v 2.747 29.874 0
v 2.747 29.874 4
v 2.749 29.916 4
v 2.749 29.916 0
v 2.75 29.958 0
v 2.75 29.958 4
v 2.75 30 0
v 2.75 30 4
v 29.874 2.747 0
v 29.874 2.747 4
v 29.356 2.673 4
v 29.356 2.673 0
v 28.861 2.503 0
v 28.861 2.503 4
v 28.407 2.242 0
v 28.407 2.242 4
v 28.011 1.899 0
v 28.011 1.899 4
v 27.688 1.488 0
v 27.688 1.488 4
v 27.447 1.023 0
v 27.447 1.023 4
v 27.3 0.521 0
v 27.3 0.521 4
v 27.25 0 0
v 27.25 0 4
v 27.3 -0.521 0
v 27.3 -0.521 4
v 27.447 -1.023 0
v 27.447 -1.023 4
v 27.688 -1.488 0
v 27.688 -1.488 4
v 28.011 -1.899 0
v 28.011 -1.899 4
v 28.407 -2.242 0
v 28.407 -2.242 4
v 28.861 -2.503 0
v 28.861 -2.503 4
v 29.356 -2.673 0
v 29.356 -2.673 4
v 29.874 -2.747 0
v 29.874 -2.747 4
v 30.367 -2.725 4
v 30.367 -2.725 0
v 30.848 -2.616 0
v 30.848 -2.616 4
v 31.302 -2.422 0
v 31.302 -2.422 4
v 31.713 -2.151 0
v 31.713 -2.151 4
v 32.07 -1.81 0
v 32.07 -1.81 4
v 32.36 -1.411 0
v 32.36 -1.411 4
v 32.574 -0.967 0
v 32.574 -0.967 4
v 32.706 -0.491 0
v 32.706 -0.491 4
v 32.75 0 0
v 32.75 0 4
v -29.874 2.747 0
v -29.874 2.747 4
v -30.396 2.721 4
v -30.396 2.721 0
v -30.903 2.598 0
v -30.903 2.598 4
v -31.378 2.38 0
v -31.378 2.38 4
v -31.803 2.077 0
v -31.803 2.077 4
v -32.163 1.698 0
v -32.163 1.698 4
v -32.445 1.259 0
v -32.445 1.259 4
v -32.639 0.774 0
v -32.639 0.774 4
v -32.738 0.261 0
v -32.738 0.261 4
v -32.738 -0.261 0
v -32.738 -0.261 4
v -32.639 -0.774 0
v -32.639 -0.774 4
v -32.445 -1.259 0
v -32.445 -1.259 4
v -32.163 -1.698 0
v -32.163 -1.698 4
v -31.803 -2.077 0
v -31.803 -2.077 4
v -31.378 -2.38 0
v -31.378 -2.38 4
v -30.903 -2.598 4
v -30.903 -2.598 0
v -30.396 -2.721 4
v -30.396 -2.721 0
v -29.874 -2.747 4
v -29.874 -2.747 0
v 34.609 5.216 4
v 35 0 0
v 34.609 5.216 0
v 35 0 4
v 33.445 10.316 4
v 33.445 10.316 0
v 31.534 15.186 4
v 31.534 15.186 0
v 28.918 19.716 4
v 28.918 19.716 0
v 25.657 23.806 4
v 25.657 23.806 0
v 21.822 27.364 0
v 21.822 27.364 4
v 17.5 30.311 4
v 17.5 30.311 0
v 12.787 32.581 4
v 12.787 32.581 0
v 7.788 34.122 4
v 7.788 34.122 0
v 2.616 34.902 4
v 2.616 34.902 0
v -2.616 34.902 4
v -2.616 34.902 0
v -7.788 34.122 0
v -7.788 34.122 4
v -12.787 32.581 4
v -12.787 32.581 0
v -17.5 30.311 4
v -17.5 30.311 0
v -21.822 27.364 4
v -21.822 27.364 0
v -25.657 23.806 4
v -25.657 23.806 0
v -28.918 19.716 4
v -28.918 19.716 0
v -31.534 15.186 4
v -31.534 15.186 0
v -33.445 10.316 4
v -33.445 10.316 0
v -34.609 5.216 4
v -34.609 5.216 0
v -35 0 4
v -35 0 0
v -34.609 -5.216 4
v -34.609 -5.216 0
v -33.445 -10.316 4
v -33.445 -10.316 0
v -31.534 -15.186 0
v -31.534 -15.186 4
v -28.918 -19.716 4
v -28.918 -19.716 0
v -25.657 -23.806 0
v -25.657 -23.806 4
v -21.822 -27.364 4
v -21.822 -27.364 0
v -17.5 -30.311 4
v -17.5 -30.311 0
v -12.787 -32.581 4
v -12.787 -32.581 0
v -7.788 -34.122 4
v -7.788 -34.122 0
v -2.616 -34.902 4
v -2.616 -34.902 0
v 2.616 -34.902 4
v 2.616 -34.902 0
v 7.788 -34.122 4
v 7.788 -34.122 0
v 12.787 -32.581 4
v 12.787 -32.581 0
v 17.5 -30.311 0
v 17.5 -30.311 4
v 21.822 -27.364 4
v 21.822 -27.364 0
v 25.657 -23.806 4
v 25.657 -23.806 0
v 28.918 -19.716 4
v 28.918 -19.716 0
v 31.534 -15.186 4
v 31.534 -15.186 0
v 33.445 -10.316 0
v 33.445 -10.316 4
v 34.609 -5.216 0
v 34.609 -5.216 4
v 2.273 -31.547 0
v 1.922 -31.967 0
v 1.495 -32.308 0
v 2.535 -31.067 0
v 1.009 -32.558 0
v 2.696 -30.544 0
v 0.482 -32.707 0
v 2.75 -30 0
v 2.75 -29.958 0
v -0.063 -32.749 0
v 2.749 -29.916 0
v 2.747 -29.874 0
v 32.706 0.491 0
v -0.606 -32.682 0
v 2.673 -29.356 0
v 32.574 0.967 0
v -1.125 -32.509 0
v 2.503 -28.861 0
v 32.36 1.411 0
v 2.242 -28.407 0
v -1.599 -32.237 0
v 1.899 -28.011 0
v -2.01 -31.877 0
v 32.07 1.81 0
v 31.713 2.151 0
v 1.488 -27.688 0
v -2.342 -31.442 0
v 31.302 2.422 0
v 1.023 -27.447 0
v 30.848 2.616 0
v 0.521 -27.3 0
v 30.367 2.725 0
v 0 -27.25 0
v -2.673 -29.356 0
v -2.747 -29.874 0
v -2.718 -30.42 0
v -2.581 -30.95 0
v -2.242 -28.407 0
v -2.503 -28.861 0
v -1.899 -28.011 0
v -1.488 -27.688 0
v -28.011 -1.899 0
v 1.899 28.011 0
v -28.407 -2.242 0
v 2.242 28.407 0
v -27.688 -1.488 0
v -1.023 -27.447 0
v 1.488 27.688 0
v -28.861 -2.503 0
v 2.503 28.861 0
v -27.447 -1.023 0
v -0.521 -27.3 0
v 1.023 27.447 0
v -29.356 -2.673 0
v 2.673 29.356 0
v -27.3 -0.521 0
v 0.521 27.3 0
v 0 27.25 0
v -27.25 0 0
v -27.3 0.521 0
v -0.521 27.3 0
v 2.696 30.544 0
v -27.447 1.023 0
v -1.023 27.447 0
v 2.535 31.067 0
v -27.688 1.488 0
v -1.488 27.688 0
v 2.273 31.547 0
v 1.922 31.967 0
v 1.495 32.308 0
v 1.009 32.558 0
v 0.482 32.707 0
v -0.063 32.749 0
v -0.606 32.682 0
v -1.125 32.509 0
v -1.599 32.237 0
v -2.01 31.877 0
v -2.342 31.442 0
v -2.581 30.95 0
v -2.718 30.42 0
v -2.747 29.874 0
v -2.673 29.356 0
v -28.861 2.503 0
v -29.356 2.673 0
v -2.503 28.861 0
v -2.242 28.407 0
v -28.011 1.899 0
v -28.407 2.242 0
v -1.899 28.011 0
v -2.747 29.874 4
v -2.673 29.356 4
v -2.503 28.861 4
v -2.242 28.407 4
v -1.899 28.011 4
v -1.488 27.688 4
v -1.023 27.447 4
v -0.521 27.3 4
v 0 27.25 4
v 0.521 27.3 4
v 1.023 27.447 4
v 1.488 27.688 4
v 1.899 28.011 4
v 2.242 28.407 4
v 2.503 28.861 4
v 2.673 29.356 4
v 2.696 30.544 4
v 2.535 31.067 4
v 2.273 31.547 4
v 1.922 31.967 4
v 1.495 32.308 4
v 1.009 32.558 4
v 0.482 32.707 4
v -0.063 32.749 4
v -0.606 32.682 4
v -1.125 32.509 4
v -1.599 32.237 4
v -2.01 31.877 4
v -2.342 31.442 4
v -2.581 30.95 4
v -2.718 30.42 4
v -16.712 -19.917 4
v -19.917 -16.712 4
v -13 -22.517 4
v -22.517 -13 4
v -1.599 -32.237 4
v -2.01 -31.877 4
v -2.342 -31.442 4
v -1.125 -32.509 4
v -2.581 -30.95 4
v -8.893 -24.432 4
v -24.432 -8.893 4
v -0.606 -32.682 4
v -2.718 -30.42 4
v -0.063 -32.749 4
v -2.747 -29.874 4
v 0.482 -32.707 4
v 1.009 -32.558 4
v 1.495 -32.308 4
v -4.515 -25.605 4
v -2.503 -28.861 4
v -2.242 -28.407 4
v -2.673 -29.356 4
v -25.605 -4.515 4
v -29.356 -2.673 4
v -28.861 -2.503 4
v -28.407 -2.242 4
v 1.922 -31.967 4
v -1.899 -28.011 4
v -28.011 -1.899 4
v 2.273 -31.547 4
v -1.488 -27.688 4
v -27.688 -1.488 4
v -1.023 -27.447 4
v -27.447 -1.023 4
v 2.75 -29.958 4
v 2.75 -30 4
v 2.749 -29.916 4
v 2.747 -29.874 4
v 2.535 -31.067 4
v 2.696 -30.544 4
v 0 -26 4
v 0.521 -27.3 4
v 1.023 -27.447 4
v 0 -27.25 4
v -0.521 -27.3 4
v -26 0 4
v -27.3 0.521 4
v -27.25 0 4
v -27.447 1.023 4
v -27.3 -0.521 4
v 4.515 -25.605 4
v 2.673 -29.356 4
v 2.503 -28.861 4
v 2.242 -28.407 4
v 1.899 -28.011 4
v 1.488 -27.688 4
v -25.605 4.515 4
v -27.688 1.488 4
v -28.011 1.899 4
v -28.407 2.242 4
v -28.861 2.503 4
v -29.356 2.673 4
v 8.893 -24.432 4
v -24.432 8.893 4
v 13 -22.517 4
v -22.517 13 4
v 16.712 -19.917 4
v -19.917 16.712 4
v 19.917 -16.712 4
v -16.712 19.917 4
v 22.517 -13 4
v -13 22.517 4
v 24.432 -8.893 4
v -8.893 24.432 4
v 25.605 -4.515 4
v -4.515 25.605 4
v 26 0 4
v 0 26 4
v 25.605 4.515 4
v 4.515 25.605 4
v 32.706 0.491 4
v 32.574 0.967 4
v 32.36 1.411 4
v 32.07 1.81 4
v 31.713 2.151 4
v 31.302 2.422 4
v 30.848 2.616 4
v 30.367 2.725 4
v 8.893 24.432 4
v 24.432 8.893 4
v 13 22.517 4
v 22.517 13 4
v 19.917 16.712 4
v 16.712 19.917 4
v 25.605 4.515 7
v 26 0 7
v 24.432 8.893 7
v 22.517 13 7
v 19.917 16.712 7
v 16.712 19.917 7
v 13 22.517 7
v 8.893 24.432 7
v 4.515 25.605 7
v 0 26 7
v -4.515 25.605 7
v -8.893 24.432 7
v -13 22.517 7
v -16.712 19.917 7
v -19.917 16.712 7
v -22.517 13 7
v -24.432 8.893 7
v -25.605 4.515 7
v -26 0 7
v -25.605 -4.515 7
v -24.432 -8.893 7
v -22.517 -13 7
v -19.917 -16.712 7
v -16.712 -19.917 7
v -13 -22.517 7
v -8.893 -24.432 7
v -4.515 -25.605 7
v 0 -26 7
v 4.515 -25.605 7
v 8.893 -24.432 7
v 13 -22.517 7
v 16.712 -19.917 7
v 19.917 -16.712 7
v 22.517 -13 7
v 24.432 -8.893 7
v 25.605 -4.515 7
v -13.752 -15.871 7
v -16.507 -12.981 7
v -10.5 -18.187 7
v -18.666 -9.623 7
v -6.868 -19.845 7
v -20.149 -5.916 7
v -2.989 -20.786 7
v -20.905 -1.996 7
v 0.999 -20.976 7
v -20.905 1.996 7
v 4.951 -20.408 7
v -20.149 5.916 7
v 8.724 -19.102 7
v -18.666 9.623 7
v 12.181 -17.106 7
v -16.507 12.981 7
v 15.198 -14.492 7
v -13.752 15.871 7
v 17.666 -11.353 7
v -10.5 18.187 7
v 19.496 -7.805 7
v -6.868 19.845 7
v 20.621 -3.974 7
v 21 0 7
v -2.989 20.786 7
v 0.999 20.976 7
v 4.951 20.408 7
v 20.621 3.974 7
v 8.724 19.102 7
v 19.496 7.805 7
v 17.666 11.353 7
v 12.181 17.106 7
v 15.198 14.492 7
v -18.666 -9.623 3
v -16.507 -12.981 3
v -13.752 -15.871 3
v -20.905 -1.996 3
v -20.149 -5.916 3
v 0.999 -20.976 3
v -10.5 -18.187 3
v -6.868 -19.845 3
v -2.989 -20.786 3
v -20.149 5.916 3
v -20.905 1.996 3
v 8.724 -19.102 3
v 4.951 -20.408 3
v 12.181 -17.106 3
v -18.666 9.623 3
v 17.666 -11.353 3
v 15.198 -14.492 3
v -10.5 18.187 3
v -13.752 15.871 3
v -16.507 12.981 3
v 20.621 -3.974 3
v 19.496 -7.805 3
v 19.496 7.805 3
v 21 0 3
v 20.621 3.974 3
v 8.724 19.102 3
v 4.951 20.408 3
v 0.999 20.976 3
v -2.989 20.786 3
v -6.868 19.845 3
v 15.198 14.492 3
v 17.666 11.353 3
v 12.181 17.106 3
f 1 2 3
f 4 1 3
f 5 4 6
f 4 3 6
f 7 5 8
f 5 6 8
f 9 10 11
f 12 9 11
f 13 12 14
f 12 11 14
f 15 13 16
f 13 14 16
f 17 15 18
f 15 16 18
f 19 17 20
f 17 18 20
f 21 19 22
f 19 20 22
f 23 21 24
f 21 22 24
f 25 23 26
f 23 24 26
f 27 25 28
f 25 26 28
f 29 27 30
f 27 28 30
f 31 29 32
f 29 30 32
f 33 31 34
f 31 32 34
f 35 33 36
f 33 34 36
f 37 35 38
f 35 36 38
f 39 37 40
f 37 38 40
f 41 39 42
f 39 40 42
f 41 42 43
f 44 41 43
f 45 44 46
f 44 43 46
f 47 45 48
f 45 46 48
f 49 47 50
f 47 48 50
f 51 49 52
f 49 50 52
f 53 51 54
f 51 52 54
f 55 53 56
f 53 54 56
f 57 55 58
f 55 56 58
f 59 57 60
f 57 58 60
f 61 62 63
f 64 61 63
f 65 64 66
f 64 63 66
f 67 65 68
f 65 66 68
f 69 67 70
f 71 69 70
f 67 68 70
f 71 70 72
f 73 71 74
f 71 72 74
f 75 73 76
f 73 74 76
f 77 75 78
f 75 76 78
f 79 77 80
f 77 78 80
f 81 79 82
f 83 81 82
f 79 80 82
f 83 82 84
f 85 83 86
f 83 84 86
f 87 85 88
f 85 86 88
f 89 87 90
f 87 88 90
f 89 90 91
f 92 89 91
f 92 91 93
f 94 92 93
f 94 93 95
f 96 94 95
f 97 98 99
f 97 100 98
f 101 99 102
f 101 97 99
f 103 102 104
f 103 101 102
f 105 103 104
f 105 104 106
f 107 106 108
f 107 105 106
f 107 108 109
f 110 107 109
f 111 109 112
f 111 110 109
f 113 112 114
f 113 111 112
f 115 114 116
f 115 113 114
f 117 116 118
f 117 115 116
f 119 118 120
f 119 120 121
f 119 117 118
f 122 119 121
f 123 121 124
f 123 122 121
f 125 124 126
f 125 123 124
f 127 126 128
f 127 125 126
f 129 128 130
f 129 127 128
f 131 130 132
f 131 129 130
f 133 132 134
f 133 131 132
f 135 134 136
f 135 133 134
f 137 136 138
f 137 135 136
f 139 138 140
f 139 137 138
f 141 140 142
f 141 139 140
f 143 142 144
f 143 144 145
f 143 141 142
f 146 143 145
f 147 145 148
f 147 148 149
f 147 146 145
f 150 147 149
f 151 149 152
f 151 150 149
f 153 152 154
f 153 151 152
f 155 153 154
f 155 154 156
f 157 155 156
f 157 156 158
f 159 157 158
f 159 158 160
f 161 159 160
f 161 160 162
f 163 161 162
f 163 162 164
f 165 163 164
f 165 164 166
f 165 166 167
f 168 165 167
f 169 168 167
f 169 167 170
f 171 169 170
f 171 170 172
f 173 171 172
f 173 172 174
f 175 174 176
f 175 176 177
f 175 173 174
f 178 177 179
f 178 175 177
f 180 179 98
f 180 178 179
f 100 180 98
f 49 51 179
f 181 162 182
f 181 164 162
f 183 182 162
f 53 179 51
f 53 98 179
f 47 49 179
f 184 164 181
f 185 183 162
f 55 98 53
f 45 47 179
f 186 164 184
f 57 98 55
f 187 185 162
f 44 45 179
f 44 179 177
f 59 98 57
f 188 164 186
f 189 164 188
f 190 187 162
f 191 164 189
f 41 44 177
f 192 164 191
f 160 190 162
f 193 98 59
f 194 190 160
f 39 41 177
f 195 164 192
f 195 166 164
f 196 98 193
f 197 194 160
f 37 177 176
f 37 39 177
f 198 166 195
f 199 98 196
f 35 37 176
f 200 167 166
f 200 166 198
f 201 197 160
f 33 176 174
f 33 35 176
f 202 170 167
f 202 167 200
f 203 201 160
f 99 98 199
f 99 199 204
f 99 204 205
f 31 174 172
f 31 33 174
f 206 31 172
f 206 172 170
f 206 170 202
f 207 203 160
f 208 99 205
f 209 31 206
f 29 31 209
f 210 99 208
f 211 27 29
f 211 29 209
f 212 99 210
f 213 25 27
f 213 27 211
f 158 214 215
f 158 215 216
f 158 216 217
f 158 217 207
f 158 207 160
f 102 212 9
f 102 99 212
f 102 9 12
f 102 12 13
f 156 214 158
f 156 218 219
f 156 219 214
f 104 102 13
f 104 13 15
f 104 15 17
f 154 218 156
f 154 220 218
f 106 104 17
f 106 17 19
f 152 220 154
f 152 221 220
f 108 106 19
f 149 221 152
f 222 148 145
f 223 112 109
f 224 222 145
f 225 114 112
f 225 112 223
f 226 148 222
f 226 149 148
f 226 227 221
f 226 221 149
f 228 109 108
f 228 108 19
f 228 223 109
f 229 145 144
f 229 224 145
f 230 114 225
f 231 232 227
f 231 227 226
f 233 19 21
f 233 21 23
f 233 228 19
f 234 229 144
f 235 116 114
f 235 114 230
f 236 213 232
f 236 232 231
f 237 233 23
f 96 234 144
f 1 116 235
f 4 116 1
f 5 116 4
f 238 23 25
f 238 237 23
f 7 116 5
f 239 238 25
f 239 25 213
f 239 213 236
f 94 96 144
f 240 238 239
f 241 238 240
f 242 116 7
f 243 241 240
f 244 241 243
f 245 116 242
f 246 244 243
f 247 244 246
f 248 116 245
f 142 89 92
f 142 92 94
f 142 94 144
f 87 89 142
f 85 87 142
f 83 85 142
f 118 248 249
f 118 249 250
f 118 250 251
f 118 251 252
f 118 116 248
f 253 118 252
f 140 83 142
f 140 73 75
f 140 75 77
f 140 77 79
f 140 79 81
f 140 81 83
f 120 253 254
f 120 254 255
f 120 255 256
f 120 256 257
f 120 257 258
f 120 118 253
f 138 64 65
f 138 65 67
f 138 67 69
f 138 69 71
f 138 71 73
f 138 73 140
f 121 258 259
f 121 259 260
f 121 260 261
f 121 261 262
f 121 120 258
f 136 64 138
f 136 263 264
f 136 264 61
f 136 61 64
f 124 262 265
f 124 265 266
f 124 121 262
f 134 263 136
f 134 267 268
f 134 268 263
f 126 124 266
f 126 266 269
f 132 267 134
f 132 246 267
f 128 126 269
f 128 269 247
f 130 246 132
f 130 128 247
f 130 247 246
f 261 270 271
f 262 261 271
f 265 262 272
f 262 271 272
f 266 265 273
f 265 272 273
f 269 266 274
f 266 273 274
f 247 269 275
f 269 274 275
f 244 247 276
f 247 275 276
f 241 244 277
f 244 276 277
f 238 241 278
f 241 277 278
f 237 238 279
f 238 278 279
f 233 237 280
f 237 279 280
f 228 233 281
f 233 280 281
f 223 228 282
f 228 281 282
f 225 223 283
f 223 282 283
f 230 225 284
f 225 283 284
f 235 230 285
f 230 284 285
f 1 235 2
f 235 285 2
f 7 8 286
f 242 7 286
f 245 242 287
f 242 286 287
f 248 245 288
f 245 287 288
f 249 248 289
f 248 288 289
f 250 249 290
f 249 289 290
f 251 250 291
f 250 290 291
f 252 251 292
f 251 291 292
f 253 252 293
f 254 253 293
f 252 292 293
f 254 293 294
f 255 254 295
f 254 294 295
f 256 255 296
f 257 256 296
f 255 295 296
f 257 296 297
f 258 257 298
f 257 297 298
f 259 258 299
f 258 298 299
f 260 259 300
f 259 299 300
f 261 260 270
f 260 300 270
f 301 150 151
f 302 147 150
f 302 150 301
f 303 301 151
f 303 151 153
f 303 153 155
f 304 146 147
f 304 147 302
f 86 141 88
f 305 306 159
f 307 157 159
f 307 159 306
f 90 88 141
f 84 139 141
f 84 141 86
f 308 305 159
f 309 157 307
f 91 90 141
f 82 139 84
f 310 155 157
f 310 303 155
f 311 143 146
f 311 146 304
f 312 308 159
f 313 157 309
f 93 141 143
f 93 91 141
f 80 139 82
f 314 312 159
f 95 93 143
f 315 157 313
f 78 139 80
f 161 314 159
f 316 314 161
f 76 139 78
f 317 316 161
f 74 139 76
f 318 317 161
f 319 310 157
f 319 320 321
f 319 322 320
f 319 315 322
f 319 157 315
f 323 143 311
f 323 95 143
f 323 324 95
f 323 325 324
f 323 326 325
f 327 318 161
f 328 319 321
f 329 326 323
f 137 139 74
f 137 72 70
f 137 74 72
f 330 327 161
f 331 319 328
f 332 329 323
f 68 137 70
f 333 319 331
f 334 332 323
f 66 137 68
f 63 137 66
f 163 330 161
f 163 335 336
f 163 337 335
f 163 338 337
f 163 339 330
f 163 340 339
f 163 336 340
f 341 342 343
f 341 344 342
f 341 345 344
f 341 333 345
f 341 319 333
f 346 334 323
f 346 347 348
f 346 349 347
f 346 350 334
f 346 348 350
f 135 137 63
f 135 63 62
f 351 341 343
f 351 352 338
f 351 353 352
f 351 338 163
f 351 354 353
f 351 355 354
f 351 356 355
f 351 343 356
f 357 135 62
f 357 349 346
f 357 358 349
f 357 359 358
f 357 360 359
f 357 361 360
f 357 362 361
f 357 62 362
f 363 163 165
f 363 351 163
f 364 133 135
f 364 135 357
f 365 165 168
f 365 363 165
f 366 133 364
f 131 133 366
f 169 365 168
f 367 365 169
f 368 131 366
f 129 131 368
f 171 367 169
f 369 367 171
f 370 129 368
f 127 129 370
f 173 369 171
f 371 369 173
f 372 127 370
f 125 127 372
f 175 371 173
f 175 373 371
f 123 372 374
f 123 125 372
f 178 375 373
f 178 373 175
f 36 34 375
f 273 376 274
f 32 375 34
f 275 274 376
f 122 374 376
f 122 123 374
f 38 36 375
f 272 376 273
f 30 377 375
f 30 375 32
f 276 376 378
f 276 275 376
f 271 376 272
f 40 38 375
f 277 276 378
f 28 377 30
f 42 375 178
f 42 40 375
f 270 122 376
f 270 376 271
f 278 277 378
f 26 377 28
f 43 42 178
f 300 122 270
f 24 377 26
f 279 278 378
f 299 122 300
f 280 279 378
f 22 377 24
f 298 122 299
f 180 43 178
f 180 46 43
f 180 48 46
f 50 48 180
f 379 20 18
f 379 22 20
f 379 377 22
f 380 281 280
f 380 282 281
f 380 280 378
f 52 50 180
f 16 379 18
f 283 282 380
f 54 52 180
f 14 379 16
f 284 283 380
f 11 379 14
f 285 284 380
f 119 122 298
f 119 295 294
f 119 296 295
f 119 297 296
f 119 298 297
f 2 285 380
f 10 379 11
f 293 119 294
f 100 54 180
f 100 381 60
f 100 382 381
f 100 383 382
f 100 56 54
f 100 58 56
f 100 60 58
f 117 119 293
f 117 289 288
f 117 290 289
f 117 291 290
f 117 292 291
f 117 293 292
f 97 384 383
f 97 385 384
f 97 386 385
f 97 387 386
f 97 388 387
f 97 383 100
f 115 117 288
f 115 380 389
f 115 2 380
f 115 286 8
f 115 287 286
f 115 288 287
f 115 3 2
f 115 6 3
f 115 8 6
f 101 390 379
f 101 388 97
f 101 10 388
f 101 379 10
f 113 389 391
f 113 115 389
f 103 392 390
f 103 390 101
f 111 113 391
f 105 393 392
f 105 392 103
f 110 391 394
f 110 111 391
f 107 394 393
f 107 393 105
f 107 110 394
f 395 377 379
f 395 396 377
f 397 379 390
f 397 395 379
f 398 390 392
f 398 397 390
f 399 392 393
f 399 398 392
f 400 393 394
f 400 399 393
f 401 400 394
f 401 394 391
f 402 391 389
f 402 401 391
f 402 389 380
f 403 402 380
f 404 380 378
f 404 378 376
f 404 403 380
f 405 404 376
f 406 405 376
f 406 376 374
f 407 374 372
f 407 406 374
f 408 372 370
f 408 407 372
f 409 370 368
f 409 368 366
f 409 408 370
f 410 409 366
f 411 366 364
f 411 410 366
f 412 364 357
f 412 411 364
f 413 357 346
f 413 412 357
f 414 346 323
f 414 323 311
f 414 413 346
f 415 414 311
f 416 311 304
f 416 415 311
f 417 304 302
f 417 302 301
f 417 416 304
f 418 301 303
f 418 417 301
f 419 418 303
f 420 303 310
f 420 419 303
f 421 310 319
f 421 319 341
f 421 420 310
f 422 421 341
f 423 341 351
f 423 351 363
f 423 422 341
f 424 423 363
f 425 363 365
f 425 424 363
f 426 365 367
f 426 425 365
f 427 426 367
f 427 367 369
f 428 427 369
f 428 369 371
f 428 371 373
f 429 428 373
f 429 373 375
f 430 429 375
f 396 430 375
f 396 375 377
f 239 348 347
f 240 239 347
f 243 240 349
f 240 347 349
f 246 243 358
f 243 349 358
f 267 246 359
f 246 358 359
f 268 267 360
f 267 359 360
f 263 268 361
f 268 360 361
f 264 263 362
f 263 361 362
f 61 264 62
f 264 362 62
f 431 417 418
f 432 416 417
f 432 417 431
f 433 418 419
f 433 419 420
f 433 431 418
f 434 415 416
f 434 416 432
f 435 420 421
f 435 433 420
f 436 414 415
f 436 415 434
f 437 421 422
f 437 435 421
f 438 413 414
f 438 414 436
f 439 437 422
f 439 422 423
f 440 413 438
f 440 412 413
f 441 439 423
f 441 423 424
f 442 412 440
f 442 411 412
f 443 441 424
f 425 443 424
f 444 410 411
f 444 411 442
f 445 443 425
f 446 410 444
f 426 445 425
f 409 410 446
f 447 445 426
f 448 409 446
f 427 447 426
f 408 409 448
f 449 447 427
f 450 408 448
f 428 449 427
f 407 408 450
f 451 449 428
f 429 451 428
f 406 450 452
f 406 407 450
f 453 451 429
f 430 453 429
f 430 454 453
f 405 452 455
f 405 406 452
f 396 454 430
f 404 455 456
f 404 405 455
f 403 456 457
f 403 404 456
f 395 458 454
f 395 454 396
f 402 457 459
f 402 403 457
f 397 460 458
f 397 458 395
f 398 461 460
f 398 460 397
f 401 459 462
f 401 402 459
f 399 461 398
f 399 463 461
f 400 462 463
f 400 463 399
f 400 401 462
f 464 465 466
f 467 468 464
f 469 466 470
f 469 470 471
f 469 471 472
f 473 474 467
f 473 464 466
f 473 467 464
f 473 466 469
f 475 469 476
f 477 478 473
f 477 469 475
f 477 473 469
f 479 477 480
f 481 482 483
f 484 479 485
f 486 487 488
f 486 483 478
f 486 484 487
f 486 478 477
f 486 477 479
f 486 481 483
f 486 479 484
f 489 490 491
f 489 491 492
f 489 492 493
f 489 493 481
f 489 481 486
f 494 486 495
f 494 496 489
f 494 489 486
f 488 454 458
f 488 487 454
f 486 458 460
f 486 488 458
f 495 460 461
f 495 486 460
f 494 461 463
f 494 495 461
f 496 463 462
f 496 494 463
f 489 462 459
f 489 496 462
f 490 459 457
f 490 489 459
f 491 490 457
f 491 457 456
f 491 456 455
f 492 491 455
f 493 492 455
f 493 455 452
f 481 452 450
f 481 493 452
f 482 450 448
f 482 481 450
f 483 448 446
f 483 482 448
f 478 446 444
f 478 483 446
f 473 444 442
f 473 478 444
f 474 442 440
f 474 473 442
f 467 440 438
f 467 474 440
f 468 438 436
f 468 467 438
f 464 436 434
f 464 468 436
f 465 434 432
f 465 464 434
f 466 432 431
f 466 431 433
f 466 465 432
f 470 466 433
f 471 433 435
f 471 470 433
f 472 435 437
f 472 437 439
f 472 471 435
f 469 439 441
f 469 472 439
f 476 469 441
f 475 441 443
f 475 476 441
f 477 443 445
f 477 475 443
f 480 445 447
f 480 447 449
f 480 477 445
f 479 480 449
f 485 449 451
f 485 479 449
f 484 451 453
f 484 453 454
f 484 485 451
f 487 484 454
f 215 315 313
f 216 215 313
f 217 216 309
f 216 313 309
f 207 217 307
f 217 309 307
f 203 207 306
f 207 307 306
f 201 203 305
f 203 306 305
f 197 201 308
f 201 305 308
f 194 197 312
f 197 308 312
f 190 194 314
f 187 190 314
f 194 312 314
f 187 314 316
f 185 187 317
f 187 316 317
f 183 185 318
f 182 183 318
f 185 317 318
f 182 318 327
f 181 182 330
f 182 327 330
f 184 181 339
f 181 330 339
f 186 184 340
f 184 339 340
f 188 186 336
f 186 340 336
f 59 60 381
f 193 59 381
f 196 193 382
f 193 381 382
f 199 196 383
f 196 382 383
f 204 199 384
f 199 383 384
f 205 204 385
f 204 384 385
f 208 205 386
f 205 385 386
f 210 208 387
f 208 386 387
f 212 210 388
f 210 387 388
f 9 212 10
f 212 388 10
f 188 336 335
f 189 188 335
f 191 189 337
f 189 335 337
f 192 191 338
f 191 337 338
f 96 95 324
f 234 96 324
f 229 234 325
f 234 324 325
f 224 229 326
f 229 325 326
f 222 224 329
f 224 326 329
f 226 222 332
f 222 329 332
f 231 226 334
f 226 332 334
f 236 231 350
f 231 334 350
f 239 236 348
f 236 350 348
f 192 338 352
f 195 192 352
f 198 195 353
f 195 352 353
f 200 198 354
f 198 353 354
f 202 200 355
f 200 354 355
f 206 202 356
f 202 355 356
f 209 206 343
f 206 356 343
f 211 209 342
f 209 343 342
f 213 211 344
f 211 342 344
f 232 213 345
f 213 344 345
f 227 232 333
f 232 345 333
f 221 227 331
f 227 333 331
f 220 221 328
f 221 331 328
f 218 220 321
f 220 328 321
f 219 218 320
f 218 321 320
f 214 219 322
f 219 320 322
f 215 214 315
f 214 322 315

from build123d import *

# Parameters (mm, degrees)
F3_DEPTH = 4


with BuildPart() as f1:
    # F0 (on Front) → F1 (revolve)
    with BuildSketch(Plane.XZ):
        Polygon((0, 3), (0, 0), (35, 0), (35, 4), (26, 4), (26, 7), (21, 7), (21, 3), align=None)
    revolve(axis=Axis((0, 0, 21.586414), (0, 0, 1)))

    # F2 (on face) → F3 (cut)
    with BuildSketch(Plane.XY.offset(4)):
        with BuildLine():
            ThreePointArc((2.75, 30), (-0.063037, 32.749277), (-2.74711, 29.873958))
            ThreePointArc((-2.74711, 29.873958), (0, 27.25), (2.74711, 29.873958))
            ThreePointArc((2.74711, 29.873958), (2.749277, 29.936963), (2.75, 30))
        make_face()
        with BuildLine():
            ThreePointArc((-27.25, 0), (-28.011393, 1.899459), (-29.873958, 2.74711))
            ThreePointArc((-29.873958, 2.74711), (-32.75, 0), (-29.873958, -2.74711))
            ThreePointArc((-29.873958, -2.74711), (-28.011393, -1.899459), (-27.25, 0))
        make_face()
        with BuildLine():
            ThreePointArc((2.74711, -29.873958), (0, -27.25), (-2.74711, -29.873958))
            ThreePointArc((-2.74711, -29.873958), (-0.063037, -32.749277), (2.75, -30))
            ThreePointArc((2.75, -30), (2.749277, -29.936963), (2.74711, -29.873958))
        make_face()
        with BuildLine():
            ThreePointArc((32.75, 0), (31.899459, 1.988607), (29.873958, 2.74711))
            ThreePointArc((29.873958, 2.74711), (27.25, 0), (29.873958, -2.74711))
            ThreePointArc((29.873958, -2.74711), (31.899459, -1.988607), (32.75, 0))
        make_face()
    extrude(amount=-F3_DEPTH, mode=Mode.SUBTRACT)


solid = f1.part
